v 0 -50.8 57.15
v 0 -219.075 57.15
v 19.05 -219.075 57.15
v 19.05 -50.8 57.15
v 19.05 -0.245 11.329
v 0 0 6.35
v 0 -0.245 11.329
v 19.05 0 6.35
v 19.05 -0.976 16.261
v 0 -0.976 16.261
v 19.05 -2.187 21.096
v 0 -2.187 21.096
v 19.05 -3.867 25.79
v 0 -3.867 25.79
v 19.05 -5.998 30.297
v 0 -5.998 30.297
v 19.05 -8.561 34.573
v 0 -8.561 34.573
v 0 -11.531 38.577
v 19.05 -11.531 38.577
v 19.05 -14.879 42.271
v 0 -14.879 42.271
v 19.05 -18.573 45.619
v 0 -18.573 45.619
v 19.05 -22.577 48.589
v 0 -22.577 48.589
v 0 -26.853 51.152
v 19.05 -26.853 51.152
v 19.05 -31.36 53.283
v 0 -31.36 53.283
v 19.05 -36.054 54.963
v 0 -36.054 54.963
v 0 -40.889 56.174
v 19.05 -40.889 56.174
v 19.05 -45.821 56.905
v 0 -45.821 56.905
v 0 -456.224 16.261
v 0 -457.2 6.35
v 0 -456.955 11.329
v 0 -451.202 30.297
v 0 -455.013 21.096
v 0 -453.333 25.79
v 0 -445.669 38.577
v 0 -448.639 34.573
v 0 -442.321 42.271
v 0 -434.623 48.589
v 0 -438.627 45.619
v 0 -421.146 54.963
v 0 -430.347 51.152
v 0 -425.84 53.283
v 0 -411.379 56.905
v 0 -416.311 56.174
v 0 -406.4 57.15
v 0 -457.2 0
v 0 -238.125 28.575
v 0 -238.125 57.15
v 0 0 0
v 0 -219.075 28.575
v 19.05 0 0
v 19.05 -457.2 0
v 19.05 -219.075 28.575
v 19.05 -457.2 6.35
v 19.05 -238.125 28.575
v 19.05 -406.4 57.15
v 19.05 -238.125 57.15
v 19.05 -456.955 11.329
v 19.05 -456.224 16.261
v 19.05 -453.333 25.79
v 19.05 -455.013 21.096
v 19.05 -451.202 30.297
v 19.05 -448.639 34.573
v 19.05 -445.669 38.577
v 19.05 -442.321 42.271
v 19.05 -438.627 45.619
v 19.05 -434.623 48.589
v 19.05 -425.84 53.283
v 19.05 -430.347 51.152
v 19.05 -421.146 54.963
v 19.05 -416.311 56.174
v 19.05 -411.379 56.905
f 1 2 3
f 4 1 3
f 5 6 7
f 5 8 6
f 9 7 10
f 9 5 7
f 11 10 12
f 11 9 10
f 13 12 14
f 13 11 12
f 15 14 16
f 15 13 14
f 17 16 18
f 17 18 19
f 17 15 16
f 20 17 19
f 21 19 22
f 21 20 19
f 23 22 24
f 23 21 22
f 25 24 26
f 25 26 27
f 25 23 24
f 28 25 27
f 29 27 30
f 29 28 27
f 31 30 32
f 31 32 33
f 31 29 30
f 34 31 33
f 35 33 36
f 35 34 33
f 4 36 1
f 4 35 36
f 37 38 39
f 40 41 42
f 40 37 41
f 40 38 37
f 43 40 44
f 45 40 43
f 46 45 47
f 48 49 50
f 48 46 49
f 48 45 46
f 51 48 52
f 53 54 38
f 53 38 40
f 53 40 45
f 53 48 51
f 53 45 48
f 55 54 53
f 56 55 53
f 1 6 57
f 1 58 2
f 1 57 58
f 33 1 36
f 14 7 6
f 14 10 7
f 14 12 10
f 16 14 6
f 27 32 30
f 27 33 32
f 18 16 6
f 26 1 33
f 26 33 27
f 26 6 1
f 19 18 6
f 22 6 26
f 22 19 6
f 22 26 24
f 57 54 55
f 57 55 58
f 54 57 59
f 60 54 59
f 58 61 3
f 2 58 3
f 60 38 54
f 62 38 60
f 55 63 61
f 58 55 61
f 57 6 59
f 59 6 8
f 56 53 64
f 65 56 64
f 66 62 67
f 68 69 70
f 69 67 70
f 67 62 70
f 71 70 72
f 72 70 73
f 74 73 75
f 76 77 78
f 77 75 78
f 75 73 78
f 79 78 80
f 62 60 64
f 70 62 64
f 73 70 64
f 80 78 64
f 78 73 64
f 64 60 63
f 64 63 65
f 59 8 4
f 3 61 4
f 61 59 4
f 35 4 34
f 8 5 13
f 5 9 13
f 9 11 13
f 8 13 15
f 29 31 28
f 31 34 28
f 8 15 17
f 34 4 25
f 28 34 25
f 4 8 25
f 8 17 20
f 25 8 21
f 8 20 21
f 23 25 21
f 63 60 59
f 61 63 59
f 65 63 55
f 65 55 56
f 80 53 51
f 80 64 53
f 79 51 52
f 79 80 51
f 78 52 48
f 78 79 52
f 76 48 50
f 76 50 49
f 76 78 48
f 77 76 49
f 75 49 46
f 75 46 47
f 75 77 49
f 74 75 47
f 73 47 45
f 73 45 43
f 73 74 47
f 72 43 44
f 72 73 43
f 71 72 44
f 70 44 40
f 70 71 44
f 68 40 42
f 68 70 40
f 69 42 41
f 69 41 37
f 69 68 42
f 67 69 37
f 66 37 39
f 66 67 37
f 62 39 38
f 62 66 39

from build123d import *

# Parameters (mm, degrees)
F0_W     = 19.05
F0_H     = 57.15
F1_DEPTH = 457.2
F2_W     = 19.05
F2_H     = 28.575
F3_DEPTH = 19.05
F4_R     = 50.8


with BuildPart() as f1:
    # F0 (on Front) → F1 (new body)
    with BuildSketch(Plane.XZ):
        with Locations((9.525, 28.575)):
            Rectangle(F0_W, F0_H)
    extrude(amount=F1_DEPTH)

    # F2 (on face) → F3 (cut, through all)
    with BuildSketch(Plane.YZ.offset(19.05)):
        with Locations((-228.6, 42.8625)):
            Rectangle(F2_W, F2_H)
    extrude(amount=-F3_DEPTH, mode=Mode.SUBTRACT)

    # F4
    f4_edges = [f1.edges().sort_by_distance(p)[0] for p in [
        (9.525, 0, 57.15),
        (9.525, -457.2, 57.15),
    ]]
    fillet(f4_edges, radius=F4_R)


solid = f1.part
